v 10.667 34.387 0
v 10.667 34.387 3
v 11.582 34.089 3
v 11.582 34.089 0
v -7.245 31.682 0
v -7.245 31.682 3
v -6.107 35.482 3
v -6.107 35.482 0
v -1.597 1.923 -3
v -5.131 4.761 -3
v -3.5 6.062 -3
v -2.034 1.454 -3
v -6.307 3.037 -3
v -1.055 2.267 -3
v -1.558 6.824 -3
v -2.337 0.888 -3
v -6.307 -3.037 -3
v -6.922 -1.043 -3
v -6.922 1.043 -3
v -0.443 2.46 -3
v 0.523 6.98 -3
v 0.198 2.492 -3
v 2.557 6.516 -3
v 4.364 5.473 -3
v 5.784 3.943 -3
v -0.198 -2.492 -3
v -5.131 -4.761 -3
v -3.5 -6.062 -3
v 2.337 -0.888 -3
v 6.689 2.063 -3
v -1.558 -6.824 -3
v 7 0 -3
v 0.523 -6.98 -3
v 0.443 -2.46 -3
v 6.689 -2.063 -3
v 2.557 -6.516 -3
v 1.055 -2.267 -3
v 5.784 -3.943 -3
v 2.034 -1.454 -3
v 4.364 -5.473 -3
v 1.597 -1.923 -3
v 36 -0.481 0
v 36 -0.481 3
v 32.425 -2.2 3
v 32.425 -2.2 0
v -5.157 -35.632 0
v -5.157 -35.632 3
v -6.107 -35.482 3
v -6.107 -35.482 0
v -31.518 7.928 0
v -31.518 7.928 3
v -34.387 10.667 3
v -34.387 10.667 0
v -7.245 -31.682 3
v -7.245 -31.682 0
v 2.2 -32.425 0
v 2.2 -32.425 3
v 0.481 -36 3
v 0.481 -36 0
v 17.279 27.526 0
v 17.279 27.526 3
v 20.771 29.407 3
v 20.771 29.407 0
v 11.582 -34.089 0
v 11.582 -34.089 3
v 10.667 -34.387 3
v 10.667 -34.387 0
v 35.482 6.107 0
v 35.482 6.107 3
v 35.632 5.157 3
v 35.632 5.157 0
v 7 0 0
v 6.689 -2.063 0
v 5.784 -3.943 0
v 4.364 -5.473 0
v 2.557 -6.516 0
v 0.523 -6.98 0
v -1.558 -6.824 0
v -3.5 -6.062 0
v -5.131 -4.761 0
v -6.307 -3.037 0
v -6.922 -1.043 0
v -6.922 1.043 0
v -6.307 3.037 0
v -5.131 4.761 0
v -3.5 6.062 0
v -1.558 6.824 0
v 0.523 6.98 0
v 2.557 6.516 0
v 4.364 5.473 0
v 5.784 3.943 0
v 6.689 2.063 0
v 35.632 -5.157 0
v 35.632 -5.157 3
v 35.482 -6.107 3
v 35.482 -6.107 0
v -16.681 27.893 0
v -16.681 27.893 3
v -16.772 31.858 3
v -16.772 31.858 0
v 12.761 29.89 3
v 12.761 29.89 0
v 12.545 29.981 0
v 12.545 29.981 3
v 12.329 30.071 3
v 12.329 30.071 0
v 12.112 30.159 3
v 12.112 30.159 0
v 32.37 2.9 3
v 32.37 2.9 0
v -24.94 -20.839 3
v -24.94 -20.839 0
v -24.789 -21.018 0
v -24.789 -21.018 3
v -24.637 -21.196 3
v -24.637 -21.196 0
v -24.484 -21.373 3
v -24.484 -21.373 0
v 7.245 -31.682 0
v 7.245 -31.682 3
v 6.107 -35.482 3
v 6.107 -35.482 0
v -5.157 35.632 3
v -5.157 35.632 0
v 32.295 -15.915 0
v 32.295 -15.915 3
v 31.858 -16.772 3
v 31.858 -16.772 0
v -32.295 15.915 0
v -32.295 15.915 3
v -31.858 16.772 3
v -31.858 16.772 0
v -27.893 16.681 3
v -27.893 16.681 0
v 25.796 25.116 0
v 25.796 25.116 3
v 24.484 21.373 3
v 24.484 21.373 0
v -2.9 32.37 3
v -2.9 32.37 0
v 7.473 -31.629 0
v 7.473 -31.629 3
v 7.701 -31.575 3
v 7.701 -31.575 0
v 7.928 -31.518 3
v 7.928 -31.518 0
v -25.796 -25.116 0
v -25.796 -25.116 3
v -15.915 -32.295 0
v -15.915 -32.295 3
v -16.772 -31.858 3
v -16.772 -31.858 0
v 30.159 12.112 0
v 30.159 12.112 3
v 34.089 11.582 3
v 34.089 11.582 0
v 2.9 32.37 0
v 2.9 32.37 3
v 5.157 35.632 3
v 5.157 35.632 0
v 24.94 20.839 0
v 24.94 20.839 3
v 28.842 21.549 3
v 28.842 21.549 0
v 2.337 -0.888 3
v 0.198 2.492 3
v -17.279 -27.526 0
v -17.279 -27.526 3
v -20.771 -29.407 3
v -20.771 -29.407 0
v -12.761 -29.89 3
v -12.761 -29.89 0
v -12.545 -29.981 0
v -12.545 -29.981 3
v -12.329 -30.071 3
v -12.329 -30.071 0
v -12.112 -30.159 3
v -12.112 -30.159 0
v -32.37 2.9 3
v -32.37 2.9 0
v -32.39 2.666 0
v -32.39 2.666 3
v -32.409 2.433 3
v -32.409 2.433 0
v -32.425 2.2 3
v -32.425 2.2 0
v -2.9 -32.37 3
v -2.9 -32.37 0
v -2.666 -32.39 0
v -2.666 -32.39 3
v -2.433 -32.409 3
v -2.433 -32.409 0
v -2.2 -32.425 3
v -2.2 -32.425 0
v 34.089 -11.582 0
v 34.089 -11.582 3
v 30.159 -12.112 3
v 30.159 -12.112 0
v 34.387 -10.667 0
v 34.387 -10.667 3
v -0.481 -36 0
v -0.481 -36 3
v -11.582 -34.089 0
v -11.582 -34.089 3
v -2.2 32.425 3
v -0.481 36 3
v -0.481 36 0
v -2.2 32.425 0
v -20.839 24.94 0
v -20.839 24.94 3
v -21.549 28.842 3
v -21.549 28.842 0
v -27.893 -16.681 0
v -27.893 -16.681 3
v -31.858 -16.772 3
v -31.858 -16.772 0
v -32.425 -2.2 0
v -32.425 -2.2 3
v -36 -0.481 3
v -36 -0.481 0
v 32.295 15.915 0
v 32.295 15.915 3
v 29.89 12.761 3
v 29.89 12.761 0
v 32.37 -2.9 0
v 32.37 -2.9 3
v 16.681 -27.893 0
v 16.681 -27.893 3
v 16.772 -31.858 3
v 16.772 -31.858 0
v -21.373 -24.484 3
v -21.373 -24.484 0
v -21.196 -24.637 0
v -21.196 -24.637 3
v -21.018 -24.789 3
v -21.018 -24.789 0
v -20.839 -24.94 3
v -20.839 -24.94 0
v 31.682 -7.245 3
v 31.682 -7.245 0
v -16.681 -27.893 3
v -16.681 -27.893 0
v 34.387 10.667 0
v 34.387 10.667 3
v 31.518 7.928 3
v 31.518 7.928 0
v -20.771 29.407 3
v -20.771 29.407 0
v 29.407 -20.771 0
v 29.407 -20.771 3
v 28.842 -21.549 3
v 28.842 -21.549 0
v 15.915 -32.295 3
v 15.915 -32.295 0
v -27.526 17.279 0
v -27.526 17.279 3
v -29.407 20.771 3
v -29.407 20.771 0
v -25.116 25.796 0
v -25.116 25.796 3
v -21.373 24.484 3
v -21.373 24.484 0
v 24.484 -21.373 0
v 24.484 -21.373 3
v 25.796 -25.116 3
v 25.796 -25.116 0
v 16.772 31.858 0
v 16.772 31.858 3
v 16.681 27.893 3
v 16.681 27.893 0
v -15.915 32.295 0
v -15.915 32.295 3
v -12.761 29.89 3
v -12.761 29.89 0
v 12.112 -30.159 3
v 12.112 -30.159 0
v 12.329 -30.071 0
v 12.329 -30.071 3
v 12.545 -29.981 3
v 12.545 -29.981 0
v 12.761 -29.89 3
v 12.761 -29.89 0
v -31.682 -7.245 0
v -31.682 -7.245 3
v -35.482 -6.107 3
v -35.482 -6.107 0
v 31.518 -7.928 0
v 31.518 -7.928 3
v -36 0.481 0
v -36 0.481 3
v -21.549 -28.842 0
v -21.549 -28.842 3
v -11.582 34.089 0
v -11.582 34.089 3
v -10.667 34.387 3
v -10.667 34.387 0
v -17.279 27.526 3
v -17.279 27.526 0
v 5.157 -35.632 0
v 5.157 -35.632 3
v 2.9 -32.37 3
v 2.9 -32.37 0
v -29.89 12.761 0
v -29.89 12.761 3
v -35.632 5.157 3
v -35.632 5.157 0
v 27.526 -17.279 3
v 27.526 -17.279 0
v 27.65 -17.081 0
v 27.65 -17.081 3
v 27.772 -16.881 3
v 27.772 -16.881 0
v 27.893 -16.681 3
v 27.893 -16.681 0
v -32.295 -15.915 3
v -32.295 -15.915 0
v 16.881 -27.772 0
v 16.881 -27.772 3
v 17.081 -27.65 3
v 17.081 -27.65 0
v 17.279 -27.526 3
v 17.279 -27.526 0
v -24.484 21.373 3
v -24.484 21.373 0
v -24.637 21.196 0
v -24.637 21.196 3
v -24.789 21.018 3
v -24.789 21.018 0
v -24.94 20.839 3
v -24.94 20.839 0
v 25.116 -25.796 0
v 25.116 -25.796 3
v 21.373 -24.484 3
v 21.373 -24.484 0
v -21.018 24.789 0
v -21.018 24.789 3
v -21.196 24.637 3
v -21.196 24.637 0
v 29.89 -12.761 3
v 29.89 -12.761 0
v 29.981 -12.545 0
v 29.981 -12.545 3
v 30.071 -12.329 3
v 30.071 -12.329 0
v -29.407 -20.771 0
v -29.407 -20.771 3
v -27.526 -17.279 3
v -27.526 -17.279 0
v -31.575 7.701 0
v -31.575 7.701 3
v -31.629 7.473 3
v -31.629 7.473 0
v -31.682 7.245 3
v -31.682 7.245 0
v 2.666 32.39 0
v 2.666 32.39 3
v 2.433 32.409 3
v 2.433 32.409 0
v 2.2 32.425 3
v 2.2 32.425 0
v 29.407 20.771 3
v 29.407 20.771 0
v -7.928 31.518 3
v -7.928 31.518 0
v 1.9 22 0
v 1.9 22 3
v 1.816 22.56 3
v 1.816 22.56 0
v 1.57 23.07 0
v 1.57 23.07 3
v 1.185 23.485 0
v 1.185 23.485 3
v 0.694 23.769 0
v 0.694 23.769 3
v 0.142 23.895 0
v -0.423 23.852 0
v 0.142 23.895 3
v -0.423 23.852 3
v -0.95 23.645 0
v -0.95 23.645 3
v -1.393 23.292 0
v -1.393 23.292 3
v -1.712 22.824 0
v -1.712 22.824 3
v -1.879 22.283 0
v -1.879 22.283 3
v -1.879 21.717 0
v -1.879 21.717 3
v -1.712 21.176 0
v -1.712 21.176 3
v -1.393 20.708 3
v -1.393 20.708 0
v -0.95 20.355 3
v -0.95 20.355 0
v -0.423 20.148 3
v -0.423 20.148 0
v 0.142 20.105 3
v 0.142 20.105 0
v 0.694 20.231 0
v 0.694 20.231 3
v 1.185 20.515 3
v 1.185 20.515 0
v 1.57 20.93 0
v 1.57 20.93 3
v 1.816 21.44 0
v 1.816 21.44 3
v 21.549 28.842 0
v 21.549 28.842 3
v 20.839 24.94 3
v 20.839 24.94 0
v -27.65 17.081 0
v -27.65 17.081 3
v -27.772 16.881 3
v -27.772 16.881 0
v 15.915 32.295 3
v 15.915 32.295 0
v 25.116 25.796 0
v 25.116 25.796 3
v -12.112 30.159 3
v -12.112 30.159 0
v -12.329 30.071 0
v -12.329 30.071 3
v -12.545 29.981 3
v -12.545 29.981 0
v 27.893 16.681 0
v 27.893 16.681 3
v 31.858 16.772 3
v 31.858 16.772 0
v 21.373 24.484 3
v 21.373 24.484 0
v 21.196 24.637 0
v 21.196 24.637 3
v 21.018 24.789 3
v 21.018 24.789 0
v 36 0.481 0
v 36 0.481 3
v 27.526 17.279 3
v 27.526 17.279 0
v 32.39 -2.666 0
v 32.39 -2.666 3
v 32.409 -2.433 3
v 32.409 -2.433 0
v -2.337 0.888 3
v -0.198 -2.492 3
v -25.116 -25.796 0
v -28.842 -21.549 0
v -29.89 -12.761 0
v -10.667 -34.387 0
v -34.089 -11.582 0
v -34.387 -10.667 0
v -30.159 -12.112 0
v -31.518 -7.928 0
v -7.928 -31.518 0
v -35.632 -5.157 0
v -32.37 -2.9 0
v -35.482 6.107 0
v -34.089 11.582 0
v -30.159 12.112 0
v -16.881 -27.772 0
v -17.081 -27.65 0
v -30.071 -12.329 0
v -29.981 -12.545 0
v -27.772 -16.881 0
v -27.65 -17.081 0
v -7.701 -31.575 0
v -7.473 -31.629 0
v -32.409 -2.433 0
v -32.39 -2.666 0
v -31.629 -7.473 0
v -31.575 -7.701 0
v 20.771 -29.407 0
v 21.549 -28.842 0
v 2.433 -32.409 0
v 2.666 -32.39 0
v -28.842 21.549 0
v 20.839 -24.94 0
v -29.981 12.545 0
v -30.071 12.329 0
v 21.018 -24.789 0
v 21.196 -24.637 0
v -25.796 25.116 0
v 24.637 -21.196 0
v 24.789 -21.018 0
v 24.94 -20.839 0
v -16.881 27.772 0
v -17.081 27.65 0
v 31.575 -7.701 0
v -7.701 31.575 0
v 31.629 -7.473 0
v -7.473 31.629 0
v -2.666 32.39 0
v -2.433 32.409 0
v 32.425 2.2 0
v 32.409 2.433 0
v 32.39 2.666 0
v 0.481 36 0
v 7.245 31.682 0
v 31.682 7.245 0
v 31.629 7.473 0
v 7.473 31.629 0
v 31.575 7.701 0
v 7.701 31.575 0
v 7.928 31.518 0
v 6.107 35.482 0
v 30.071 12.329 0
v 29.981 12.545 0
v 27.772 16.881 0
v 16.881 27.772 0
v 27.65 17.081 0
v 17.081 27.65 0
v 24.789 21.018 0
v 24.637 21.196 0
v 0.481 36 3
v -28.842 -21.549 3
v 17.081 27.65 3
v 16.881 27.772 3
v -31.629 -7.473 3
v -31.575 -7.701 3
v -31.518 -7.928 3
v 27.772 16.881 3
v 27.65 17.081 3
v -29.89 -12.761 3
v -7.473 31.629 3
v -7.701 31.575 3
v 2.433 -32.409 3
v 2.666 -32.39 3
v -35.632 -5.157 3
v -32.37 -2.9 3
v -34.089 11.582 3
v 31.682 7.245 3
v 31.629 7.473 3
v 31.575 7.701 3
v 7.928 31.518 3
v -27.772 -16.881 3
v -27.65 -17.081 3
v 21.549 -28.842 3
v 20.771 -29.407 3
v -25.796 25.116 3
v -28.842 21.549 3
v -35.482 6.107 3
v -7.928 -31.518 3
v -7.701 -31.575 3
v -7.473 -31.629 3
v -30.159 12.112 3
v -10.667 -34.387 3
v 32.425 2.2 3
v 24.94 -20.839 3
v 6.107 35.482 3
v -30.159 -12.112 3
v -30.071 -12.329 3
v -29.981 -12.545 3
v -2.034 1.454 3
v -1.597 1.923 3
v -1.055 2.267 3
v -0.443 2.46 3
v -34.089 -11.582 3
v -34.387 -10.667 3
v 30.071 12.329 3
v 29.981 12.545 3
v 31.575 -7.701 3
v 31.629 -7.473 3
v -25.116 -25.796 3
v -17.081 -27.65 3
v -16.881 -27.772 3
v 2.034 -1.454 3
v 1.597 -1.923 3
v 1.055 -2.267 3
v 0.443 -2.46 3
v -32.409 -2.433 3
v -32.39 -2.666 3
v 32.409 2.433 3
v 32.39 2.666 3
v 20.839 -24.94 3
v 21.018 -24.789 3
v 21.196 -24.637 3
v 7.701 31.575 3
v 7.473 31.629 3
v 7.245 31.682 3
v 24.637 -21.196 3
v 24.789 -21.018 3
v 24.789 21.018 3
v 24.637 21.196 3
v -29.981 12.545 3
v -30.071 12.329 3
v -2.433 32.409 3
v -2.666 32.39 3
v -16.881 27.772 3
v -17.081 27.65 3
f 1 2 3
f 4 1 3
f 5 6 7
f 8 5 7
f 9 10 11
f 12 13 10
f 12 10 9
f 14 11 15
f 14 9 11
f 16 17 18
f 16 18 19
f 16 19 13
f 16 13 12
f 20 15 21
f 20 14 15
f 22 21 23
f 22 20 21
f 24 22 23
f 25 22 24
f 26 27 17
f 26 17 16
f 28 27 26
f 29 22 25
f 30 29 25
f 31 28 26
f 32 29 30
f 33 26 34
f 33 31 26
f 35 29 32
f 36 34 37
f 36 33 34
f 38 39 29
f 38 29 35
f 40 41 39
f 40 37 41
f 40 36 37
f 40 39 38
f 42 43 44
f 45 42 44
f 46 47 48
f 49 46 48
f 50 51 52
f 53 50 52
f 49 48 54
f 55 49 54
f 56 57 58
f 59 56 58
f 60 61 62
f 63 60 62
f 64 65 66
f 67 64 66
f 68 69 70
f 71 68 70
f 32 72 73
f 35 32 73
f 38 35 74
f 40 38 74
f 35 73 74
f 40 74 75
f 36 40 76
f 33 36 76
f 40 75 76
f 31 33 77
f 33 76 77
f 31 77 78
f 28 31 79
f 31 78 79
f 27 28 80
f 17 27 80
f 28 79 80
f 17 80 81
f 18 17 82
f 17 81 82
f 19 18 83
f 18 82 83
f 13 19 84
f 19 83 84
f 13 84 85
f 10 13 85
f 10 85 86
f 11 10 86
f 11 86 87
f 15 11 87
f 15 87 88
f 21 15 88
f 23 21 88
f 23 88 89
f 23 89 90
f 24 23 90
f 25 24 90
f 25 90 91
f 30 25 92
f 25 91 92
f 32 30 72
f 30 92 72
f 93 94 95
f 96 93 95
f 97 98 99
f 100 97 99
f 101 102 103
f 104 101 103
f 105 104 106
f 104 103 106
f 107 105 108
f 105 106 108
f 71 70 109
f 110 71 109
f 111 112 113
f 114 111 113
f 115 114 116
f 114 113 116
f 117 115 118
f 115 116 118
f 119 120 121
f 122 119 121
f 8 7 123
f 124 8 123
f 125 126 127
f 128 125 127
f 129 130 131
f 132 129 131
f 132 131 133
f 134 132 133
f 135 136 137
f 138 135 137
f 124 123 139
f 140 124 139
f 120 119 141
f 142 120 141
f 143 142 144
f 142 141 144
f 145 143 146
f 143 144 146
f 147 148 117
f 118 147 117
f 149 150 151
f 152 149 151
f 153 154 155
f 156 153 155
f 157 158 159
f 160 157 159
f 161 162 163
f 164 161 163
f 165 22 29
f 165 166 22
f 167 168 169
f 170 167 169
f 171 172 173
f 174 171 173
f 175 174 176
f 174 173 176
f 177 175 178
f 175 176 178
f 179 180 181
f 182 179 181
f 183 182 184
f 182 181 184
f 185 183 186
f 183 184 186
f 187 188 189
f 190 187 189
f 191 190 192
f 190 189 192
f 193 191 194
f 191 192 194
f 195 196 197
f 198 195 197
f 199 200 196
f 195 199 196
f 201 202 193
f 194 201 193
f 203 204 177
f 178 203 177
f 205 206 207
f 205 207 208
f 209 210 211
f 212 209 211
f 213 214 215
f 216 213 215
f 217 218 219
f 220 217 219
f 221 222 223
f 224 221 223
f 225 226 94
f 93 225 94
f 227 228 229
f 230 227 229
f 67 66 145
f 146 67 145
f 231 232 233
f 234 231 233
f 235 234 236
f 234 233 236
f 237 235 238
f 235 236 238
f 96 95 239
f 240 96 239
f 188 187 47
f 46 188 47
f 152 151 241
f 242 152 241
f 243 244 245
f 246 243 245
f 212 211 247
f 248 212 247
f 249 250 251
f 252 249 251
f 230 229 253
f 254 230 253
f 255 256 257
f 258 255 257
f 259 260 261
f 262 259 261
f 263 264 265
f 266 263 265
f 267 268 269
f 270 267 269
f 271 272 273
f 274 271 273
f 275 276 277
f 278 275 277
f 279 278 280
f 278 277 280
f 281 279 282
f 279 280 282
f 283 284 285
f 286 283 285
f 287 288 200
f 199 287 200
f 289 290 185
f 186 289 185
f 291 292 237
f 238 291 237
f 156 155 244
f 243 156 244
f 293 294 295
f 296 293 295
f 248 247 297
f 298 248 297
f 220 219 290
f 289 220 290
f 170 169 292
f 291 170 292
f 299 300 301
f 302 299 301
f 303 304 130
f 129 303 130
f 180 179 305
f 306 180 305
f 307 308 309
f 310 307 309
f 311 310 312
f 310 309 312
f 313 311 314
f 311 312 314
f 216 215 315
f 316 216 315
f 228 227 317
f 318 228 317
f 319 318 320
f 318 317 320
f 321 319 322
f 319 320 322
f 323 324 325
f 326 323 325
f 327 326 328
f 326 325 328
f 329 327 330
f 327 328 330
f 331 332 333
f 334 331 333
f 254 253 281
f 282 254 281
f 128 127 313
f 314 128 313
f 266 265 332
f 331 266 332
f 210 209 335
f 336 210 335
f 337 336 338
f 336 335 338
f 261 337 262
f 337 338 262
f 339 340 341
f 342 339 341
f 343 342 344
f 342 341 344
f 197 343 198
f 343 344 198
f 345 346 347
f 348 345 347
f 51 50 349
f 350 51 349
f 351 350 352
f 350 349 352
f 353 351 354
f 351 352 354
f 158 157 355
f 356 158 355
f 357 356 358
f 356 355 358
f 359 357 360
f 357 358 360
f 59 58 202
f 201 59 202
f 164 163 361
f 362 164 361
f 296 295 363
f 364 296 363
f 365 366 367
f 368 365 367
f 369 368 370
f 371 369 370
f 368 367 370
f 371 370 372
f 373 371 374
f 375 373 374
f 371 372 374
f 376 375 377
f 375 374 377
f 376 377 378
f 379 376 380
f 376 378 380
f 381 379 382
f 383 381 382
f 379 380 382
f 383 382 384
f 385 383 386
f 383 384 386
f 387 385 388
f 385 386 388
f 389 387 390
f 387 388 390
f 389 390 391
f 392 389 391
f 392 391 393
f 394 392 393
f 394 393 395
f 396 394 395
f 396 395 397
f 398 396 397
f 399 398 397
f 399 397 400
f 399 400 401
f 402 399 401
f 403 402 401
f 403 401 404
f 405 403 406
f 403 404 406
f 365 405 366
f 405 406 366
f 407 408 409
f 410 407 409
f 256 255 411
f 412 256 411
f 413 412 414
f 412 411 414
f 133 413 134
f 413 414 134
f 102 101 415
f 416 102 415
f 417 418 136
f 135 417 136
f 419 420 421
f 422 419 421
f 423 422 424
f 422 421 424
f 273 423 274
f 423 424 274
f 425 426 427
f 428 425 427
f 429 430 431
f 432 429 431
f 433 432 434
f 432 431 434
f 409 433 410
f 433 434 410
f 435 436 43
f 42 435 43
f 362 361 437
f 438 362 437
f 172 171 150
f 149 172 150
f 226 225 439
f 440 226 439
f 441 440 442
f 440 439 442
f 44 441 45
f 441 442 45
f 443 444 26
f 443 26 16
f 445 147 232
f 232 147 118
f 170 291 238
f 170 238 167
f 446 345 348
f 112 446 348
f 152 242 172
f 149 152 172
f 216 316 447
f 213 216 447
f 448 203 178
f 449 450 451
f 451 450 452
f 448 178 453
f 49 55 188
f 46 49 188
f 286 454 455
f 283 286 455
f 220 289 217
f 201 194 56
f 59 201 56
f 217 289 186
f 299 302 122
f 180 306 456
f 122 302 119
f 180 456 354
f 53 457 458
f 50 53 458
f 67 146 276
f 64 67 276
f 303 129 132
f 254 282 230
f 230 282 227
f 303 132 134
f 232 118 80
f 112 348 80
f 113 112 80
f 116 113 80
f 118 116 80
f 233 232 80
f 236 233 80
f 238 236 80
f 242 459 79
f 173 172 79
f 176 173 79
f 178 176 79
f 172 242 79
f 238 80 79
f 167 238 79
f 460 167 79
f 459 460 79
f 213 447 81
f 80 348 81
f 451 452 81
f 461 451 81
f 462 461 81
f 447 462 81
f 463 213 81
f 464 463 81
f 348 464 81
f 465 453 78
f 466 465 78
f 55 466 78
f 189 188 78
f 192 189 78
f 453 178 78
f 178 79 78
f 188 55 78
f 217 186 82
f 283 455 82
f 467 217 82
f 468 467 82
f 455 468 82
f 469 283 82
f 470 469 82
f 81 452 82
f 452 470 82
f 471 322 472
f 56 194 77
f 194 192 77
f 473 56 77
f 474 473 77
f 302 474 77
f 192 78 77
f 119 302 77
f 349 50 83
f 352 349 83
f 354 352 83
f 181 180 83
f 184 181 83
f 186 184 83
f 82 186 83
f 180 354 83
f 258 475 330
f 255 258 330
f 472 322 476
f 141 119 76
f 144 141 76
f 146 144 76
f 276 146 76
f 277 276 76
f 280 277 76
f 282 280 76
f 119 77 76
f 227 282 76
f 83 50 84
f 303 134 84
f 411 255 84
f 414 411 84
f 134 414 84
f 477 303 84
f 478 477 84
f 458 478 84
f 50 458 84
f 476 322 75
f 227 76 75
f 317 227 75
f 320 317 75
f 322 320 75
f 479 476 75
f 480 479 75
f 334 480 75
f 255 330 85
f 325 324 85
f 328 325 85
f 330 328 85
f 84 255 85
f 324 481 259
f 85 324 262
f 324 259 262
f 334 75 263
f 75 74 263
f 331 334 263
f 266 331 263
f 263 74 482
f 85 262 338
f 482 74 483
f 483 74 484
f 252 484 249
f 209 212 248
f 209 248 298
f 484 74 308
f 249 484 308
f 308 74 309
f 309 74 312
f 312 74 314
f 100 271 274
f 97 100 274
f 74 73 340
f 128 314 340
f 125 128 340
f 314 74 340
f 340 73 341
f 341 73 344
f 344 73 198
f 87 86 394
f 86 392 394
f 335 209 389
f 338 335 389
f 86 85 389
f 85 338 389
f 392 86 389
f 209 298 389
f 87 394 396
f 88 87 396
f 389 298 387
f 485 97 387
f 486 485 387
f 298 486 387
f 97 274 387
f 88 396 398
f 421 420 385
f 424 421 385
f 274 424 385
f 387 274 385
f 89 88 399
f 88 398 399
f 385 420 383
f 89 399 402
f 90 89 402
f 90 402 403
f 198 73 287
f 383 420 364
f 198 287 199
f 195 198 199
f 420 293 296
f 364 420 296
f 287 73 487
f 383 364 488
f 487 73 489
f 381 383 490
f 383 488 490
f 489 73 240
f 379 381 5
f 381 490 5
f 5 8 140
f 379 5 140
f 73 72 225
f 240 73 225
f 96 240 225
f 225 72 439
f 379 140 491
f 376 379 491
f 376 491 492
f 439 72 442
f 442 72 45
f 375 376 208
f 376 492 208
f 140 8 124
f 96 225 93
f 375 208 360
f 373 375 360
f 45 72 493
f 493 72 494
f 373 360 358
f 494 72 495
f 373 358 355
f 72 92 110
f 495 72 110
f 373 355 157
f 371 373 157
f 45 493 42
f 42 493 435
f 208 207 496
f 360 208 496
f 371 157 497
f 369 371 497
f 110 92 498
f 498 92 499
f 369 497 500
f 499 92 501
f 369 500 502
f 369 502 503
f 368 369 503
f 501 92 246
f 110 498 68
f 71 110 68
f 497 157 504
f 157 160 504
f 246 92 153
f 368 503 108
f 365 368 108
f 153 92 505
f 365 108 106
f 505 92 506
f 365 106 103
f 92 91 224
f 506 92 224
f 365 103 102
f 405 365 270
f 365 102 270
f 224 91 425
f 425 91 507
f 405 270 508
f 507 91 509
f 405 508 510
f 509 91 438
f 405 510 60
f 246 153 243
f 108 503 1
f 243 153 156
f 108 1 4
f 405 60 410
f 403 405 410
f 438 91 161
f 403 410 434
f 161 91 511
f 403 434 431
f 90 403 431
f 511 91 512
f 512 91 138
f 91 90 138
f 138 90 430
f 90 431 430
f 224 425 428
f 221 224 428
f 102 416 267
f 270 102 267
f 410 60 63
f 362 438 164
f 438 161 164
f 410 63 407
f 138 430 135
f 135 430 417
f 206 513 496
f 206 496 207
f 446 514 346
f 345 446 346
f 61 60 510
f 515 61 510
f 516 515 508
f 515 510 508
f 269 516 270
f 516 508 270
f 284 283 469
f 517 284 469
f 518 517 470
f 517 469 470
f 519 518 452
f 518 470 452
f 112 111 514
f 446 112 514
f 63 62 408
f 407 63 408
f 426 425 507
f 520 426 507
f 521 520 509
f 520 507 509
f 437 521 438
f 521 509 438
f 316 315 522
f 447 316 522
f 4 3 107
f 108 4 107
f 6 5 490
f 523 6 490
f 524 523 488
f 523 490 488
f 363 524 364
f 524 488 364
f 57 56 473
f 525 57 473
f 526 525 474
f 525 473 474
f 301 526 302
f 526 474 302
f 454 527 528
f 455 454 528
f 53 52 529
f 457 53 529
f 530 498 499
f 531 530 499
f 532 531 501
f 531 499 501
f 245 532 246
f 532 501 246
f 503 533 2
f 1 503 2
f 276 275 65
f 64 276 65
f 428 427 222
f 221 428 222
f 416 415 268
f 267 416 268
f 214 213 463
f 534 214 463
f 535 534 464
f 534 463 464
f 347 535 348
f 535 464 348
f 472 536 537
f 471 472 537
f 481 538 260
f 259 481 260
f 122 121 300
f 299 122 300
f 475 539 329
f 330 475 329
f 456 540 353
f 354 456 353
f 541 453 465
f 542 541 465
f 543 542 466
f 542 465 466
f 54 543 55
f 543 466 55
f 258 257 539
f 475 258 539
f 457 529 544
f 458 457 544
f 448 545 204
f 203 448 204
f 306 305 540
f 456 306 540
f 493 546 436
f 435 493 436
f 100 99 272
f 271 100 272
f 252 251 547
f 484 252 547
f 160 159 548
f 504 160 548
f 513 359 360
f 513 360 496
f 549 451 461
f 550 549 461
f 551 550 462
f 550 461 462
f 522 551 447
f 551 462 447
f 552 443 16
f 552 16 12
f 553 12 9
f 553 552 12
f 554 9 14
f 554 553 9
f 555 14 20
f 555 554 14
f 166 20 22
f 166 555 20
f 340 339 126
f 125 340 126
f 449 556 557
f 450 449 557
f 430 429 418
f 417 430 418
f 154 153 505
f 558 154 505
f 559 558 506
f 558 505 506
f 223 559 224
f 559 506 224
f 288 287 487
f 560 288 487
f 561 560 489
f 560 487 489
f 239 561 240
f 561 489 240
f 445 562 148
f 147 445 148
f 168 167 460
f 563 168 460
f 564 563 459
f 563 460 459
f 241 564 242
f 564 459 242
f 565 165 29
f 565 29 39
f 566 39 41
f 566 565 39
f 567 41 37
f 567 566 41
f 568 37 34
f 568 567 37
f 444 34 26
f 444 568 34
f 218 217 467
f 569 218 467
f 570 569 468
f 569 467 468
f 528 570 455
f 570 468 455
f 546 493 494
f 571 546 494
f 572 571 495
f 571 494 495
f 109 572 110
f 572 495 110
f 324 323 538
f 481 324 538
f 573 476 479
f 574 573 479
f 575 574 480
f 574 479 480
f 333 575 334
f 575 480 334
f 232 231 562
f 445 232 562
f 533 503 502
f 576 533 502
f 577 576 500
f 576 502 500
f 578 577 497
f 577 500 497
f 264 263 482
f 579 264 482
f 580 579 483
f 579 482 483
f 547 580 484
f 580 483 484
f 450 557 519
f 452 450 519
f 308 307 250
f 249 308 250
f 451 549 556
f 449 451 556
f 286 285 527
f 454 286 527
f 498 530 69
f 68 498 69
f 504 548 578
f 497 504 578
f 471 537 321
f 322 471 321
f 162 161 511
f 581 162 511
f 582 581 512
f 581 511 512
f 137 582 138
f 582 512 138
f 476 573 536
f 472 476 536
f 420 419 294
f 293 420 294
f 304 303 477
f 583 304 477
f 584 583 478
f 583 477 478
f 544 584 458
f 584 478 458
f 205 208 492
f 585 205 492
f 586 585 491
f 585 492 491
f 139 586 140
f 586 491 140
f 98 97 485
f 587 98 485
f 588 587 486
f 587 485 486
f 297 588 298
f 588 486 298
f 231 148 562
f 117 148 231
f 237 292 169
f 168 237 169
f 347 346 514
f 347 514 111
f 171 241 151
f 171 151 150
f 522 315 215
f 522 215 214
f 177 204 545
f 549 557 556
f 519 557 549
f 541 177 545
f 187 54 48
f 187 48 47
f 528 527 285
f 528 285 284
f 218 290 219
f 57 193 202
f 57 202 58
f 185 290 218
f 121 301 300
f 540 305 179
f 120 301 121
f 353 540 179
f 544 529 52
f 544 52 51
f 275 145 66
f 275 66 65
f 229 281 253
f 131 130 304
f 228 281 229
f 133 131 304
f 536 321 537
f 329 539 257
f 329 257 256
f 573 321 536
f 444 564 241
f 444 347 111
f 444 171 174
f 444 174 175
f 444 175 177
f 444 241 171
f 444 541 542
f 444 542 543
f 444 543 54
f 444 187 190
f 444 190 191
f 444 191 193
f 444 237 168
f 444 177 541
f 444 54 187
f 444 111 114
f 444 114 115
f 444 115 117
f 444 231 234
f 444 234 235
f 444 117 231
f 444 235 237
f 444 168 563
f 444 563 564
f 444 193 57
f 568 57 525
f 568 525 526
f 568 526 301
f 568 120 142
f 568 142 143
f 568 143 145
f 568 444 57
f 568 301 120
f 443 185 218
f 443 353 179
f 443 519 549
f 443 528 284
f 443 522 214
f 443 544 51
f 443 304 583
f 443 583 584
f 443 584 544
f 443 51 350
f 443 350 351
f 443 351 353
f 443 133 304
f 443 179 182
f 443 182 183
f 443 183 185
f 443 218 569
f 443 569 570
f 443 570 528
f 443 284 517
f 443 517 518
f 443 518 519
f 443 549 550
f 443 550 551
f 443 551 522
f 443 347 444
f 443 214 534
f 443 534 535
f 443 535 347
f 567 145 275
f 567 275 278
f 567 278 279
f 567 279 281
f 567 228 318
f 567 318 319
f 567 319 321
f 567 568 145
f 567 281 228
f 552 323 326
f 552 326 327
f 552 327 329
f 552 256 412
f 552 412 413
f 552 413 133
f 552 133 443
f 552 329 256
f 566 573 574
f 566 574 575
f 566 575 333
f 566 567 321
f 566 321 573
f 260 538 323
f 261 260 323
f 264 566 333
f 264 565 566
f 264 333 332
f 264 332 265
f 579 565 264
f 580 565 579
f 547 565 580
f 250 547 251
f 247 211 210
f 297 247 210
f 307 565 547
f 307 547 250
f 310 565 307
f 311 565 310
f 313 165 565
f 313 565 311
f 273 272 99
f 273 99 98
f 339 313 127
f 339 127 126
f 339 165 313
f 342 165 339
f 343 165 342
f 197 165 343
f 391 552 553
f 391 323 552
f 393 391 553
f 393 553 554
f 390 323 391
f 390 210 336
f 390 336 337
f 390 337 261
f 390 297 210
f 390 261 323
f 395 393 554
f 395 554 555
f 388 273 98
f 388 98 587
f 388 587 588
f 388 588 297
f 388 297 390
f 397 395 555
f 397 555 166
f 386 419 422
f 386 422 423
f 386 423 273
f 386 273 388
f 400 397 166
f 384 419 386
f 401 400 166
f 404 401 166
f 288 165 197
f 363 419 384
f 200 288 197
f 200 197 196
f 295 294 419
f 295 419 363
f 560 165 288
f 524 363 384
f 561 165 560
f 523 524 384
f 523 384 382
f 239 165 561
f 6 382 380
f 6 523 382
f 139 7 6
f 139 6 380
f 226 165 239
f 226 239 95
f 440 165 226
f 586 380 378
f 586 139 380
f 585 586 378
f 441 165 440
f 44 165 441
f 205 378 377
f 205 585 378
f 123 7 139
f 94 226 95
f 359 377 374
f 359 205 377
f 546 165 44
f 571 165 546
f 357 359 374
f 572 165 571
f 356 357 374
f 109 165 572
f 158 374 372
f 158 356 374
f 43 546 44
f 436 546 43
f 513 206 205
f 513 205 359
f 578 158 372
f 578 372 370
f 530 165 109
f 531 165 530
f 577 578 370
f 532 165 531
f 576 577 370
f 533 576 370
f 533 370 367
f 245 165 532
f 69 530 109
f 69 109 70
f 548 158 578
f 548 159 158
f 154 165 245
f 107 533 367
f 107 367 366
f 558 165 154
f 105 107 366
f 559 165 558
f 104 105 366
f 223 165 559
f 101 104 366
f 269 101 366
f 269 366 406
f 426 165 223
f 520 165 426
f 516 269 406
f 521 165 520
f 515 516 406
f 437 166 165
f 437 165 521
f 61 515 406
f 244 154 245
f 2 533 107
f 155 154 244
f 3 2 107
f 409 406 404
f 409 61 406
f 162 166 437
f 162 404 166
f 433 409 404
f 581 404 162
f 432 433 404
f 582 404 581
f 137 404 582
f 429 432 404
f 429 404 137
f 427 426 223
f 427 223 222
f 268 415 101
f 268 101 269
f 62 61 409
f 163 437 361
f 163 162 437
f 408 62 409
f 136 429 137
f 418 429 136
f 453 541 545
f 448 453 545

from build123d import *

# Parameters (mm, degrees)
SKETCH1_R           = 32.5
BOSS_EXTRUDE1_DEPTH = 3
BOSS_EXTRUDE6_DEPTH = 3
CUT_EXTRUDE1_DEPTH  = 3
SKETCH5_R           = 7
BOSS_EXTRUDE7_DEPTH = 3
SKETCH7_R           = 1.9
CUT_EXTRUDE2_DEPTH  = 3


with BuildPart() as part:
    # Sketch1 → Boss-Extrude1 (new body)
    with BuildSketch(Plane.XY):
        Circle(SKETCH1_R)
    extrude(amount=BOSS_EXTRUDE1_DEPTH)

    # Sketch2 → Boss-Extrude6 (add)
    with BuildSketch(Plane.XY.offset(3)):
        Polygon((-0.480921932, 36), (-2.2, 32.425452965), (2.2, 32.425452965), (0.480921932, 36), align=None)
        Polygon((6.106641727, 35.481547496), (7.245372738, 31.682086009), (2.899544039, 32.370397655), (5.156639756, 35.632013027), align=None)
        Polygon((11.581995735, 34.089421537), (12.112340352, 30.158600949), (7.927691681, 31.518275724), (10.66722786, 34.386647637), align=None)
        Polygon((16.77216257, 31.857900882), (16.681061949, 27.892511042), (12.760633243, 29.890069241), (15.915153411, 32.294568859), align=None)
        Polygon((21.549343099, 28.841932978), (20.839040439, 24.939614944), (17.279365664, 27.525870054), (20.771195066, 29.407290617), align=None)
        Polygon((25.795907282, 25.115780963), (24.483892593, 21.372622756), (21.372622756, 24.483892593), (25.115780963, 25.795907282), align=None)
        Polygon((29.407290617, 20.771195066), (27.525870054, 17.279365664), (24.939614944, 20.83904044), (28.841932978, 21.549343099), align=None)
        Polygon((32.294568859, 15.915153411), (29.890069241, 12.760633243), (27.892511042, 16.681061949), (31.857900882, 16.77216257), align=None)
        Polygon((34.386647637, 10.66722786), (31.518275724, 7.927691681), (30.158600949, 12.112340352), (34.089421537, 11.581995735), align=None)
        Polygon((35.632013027, 5.156639756), (32.370397655, 2.899544039), (31.682086009, 7.245372738), (35.481547496, 6.106641727), align=None)
        Polygon((36, -0.480921932), (32.425452965, -2.2), (32.425452965, 2.2), (36, 0.480921932), align=None)
        Polygon((35.481547496, -6.106641727), (31.682086009, -7.245372738), (32.370397655, -2.899544039), (35.632013027, -5.156639756), align=None)
        Polygon((34.089421537, -11.581995735), (30.158600949, -12.112340352), (31.518275724, -7.927691681), (34.386647637, -10.66722786), align=None)
        Polygon((31.857900882, -16.77216257), (27.892511042, -16.681061949), (29.890069241, -12.760633243), (32.294568859, -15.915153411), align=None)
        Polygon((28.841932978, -21.549343099), (24.939614944, -20.839040439), (27.525870054, -17.279365664), (29.407290617, -20.771195066), align=None)
        Polygon((25.115780963, -25.795907282), (21.372622756, -24.483892593), (24.483892593, -21.372622756), (25.795907282, -25.115780963), align=None)
        Polygon((20.771195066, -29.407290617), (17.279365664, -27.525870054), (20.83904044, -24.939614944), (21.549343099, -28.841932978), align=None)
        Polygon((15.915153411, -32.294568859), (12.760633243, -29.890069241), (16.681061949, -27.892511042), (16.77216257, -31.857900882), align=None)
        Polygon((10.66722786, -34.386647637), (7.927691681, -31.518275724), (12.112340352, -30.158600949), (11.581995735, -34.089421537), align=None)
        Polygon((5.156639756, -35.632013027), (2.899544039, -32.370397655), (7.245372738, -31.682086009), (6.106641727, -35.481547496), align=None)
        Polygon((-0.480921932, -36), (-2.2, -32.425452965), (2.2, -32.425452965), (0.480921932, -36), align=None)
        Polygon((-6.106641727, -35.481547496), (-7.245372738, -31.682086009), (-2.899544039, -32.370397655), (-5.156639756, -35.632013027), align=None)
        Polygon((-11.581995735, -34.089421537), (-12.112340352, -30.158600949), (-7.927691681, -31.518275724), (-10.66722786, -34.386647637), align=None)
        Polygon((-16.77216257, -31.857900882), (-16.681061949, -27.892511042), (-12.760633243, -29.890069241), (-15.915153411, -32.294568859), align=None)
        Polygon((-21.549343099, -28.841932978), (-20.839040439, -24.939614944), (-17.279365664, -27.525870054), (-20.771195066, -29.407290617), align=None)
        Polygon((-25.795907282, -25.115780963), (-24.483892593, -21.372622756), (-21.372622756, -24.483892593), (-25.115780963, -25.795907282), align=None)
        Polygon((-29.407290617, -20.771195066), (-27.525870054, -17.279365664), (-24.939614944, -20.83904044), (-28.841932978, -21.549343099), align=None)
        Polygon((-32.294568859, -15.915153411), (-29.890069241, -12.760633243), (-27.892511042, -16.681061949), (-31.857900882, -16.77216257), align=None)
        Polygon((-34.386647637, -10.66722786), (-31.518275724, -7.927691681), (-30.158600949, -12.112340352), (-34.089421537, -11.581995735), align=None)
        Polygon((-35.632013027, -5.156639756), (-32.370397655, -2.899544039), (-31.682086009, -7.245372738), (-35.481547496, -6.106641727), align=None)
        Polygon((-36, 0.480921932), (-32.425452965, 2.2), (-32.425452965, -2.2), (-36, -0.480921932), align=None)
        Polygon((-35.481547496, 6.106641727), (-31.682086009, 7.245372738), (-32.370397655, 2.899544039), (-35.632013027, 5.156639756), align=None)
        Polygon((-34.089421537, 11.581995735), (-30.158600949, 12.112340352), (-31.518275724, 7.927691681), (-34.386647637, 10.66722786), align=None)
        Polygon((-31.857900882, 16.77216257), (-27.892511042, 16.681061949), (-29.890069241, 12.760633243), (-32.294568859, 15.915153411), align=None)
        Polygon((-28.841932978, 21.549343099), (-24.939614944, 20.839040439), (-27.525870054, 17.279365664), (-29.407290617, 20.771195066), align=None)
        Polygon((-25.115780963, 25.795907282), (-21.372622756, 24.483892593), (-24.483892593, 21.372622756), (-25.795907282, 25.115780963), align=None)
        Polygon((-20.771195066, 29.407290617), (-17.279365664, 27.525870054), (-20.839040439, 24.939614944), (-21.549343099, 28.841932978), align=None)
        Polygon((-15.915153411, 32.294568859), (-12.760633243, 29.890069241), (-16.681061949, 27.892511042), (-16.77216257, 31.857900882), align=None)
        Polygon((-10.66722786, 34.386647637), (-7.927691681, 31.518275724), (-12.112340352, 30.158600949), (-11.581995735, 34.089421537), align=None)
        Polygon((-5.156639756, 35.632013027), (-2.899544039, 32.370397655), (-7.245372738, 31.682086009), (-6.106641727, 35.481547496), align=None)
    extrude(amount=-BOSS_EXTRUDE6_DEPTH)

    # Sketch3 → Cut-Extrude1 (cut)
    with BuildSketch(Plane.XY.offset(3)):
        with BuildLine():
            Line((-2.337034435, 0.887845736), (-0.197962265, -2.492149863))
            ThreePointArc((-0.197962265, -2.492149863), (1.336920106, -2.11249725), (2.337034435, -0.887845736))
            Line((2.337034435, -0.887845736), (0.197962265, 2.492149863))
            ThreePointArc((0.197962265, 2.492149863), (-1.336920106, 2.11249725), (-2.337034435, 0.887845736))
        make_face()
    extrude(amount=-CUT_EXTRUDE1_DEPTH, mode=Mode.SUBTRACT)

    # Sketch5 → Boss-Extrude7 (add)
    with BuildSketch(Plane(origin=(0, 0, 0), x_dir=(-1, 0, 0), z_dir=(0, 0, -1))):
        with Locations(Location((0, 0, 0), (0, 0, 180))):
            Circle(SKETCH5_R)
        with BuildLine():
            Line((-0.197962265, 2.492149863), (-2.337034435, -0.887845736))
            ThreePointArc((-2.337034435, -0.887845736), (-1.336920106, -2.11249725), (0.197962265, -2.492149863))
            Line((0.197962265, -2.492149863), (2.337034435, 0.887845736))
            ThreePointArc((2.337034435, 0.887845736), (1.336920106, 2.11249725), (-0.197962265, 2.492149863))
        make_face(mode=Mode.SUBTRACT)
    extrude(amount=BOSS_EXTRUDE7_DEPTH)

    # Sketch7 → Cut-Extrude2 (cut)
    with BuildSketch(Plane.XY.offset(3)):
        with Locations((0, 22)):
            Circle(SKETCH7_R)
    extrude(amount=-CUT_EXTRUDE2_DEPTH, mode=Mode.SUBTRACT)


solid = part.part
